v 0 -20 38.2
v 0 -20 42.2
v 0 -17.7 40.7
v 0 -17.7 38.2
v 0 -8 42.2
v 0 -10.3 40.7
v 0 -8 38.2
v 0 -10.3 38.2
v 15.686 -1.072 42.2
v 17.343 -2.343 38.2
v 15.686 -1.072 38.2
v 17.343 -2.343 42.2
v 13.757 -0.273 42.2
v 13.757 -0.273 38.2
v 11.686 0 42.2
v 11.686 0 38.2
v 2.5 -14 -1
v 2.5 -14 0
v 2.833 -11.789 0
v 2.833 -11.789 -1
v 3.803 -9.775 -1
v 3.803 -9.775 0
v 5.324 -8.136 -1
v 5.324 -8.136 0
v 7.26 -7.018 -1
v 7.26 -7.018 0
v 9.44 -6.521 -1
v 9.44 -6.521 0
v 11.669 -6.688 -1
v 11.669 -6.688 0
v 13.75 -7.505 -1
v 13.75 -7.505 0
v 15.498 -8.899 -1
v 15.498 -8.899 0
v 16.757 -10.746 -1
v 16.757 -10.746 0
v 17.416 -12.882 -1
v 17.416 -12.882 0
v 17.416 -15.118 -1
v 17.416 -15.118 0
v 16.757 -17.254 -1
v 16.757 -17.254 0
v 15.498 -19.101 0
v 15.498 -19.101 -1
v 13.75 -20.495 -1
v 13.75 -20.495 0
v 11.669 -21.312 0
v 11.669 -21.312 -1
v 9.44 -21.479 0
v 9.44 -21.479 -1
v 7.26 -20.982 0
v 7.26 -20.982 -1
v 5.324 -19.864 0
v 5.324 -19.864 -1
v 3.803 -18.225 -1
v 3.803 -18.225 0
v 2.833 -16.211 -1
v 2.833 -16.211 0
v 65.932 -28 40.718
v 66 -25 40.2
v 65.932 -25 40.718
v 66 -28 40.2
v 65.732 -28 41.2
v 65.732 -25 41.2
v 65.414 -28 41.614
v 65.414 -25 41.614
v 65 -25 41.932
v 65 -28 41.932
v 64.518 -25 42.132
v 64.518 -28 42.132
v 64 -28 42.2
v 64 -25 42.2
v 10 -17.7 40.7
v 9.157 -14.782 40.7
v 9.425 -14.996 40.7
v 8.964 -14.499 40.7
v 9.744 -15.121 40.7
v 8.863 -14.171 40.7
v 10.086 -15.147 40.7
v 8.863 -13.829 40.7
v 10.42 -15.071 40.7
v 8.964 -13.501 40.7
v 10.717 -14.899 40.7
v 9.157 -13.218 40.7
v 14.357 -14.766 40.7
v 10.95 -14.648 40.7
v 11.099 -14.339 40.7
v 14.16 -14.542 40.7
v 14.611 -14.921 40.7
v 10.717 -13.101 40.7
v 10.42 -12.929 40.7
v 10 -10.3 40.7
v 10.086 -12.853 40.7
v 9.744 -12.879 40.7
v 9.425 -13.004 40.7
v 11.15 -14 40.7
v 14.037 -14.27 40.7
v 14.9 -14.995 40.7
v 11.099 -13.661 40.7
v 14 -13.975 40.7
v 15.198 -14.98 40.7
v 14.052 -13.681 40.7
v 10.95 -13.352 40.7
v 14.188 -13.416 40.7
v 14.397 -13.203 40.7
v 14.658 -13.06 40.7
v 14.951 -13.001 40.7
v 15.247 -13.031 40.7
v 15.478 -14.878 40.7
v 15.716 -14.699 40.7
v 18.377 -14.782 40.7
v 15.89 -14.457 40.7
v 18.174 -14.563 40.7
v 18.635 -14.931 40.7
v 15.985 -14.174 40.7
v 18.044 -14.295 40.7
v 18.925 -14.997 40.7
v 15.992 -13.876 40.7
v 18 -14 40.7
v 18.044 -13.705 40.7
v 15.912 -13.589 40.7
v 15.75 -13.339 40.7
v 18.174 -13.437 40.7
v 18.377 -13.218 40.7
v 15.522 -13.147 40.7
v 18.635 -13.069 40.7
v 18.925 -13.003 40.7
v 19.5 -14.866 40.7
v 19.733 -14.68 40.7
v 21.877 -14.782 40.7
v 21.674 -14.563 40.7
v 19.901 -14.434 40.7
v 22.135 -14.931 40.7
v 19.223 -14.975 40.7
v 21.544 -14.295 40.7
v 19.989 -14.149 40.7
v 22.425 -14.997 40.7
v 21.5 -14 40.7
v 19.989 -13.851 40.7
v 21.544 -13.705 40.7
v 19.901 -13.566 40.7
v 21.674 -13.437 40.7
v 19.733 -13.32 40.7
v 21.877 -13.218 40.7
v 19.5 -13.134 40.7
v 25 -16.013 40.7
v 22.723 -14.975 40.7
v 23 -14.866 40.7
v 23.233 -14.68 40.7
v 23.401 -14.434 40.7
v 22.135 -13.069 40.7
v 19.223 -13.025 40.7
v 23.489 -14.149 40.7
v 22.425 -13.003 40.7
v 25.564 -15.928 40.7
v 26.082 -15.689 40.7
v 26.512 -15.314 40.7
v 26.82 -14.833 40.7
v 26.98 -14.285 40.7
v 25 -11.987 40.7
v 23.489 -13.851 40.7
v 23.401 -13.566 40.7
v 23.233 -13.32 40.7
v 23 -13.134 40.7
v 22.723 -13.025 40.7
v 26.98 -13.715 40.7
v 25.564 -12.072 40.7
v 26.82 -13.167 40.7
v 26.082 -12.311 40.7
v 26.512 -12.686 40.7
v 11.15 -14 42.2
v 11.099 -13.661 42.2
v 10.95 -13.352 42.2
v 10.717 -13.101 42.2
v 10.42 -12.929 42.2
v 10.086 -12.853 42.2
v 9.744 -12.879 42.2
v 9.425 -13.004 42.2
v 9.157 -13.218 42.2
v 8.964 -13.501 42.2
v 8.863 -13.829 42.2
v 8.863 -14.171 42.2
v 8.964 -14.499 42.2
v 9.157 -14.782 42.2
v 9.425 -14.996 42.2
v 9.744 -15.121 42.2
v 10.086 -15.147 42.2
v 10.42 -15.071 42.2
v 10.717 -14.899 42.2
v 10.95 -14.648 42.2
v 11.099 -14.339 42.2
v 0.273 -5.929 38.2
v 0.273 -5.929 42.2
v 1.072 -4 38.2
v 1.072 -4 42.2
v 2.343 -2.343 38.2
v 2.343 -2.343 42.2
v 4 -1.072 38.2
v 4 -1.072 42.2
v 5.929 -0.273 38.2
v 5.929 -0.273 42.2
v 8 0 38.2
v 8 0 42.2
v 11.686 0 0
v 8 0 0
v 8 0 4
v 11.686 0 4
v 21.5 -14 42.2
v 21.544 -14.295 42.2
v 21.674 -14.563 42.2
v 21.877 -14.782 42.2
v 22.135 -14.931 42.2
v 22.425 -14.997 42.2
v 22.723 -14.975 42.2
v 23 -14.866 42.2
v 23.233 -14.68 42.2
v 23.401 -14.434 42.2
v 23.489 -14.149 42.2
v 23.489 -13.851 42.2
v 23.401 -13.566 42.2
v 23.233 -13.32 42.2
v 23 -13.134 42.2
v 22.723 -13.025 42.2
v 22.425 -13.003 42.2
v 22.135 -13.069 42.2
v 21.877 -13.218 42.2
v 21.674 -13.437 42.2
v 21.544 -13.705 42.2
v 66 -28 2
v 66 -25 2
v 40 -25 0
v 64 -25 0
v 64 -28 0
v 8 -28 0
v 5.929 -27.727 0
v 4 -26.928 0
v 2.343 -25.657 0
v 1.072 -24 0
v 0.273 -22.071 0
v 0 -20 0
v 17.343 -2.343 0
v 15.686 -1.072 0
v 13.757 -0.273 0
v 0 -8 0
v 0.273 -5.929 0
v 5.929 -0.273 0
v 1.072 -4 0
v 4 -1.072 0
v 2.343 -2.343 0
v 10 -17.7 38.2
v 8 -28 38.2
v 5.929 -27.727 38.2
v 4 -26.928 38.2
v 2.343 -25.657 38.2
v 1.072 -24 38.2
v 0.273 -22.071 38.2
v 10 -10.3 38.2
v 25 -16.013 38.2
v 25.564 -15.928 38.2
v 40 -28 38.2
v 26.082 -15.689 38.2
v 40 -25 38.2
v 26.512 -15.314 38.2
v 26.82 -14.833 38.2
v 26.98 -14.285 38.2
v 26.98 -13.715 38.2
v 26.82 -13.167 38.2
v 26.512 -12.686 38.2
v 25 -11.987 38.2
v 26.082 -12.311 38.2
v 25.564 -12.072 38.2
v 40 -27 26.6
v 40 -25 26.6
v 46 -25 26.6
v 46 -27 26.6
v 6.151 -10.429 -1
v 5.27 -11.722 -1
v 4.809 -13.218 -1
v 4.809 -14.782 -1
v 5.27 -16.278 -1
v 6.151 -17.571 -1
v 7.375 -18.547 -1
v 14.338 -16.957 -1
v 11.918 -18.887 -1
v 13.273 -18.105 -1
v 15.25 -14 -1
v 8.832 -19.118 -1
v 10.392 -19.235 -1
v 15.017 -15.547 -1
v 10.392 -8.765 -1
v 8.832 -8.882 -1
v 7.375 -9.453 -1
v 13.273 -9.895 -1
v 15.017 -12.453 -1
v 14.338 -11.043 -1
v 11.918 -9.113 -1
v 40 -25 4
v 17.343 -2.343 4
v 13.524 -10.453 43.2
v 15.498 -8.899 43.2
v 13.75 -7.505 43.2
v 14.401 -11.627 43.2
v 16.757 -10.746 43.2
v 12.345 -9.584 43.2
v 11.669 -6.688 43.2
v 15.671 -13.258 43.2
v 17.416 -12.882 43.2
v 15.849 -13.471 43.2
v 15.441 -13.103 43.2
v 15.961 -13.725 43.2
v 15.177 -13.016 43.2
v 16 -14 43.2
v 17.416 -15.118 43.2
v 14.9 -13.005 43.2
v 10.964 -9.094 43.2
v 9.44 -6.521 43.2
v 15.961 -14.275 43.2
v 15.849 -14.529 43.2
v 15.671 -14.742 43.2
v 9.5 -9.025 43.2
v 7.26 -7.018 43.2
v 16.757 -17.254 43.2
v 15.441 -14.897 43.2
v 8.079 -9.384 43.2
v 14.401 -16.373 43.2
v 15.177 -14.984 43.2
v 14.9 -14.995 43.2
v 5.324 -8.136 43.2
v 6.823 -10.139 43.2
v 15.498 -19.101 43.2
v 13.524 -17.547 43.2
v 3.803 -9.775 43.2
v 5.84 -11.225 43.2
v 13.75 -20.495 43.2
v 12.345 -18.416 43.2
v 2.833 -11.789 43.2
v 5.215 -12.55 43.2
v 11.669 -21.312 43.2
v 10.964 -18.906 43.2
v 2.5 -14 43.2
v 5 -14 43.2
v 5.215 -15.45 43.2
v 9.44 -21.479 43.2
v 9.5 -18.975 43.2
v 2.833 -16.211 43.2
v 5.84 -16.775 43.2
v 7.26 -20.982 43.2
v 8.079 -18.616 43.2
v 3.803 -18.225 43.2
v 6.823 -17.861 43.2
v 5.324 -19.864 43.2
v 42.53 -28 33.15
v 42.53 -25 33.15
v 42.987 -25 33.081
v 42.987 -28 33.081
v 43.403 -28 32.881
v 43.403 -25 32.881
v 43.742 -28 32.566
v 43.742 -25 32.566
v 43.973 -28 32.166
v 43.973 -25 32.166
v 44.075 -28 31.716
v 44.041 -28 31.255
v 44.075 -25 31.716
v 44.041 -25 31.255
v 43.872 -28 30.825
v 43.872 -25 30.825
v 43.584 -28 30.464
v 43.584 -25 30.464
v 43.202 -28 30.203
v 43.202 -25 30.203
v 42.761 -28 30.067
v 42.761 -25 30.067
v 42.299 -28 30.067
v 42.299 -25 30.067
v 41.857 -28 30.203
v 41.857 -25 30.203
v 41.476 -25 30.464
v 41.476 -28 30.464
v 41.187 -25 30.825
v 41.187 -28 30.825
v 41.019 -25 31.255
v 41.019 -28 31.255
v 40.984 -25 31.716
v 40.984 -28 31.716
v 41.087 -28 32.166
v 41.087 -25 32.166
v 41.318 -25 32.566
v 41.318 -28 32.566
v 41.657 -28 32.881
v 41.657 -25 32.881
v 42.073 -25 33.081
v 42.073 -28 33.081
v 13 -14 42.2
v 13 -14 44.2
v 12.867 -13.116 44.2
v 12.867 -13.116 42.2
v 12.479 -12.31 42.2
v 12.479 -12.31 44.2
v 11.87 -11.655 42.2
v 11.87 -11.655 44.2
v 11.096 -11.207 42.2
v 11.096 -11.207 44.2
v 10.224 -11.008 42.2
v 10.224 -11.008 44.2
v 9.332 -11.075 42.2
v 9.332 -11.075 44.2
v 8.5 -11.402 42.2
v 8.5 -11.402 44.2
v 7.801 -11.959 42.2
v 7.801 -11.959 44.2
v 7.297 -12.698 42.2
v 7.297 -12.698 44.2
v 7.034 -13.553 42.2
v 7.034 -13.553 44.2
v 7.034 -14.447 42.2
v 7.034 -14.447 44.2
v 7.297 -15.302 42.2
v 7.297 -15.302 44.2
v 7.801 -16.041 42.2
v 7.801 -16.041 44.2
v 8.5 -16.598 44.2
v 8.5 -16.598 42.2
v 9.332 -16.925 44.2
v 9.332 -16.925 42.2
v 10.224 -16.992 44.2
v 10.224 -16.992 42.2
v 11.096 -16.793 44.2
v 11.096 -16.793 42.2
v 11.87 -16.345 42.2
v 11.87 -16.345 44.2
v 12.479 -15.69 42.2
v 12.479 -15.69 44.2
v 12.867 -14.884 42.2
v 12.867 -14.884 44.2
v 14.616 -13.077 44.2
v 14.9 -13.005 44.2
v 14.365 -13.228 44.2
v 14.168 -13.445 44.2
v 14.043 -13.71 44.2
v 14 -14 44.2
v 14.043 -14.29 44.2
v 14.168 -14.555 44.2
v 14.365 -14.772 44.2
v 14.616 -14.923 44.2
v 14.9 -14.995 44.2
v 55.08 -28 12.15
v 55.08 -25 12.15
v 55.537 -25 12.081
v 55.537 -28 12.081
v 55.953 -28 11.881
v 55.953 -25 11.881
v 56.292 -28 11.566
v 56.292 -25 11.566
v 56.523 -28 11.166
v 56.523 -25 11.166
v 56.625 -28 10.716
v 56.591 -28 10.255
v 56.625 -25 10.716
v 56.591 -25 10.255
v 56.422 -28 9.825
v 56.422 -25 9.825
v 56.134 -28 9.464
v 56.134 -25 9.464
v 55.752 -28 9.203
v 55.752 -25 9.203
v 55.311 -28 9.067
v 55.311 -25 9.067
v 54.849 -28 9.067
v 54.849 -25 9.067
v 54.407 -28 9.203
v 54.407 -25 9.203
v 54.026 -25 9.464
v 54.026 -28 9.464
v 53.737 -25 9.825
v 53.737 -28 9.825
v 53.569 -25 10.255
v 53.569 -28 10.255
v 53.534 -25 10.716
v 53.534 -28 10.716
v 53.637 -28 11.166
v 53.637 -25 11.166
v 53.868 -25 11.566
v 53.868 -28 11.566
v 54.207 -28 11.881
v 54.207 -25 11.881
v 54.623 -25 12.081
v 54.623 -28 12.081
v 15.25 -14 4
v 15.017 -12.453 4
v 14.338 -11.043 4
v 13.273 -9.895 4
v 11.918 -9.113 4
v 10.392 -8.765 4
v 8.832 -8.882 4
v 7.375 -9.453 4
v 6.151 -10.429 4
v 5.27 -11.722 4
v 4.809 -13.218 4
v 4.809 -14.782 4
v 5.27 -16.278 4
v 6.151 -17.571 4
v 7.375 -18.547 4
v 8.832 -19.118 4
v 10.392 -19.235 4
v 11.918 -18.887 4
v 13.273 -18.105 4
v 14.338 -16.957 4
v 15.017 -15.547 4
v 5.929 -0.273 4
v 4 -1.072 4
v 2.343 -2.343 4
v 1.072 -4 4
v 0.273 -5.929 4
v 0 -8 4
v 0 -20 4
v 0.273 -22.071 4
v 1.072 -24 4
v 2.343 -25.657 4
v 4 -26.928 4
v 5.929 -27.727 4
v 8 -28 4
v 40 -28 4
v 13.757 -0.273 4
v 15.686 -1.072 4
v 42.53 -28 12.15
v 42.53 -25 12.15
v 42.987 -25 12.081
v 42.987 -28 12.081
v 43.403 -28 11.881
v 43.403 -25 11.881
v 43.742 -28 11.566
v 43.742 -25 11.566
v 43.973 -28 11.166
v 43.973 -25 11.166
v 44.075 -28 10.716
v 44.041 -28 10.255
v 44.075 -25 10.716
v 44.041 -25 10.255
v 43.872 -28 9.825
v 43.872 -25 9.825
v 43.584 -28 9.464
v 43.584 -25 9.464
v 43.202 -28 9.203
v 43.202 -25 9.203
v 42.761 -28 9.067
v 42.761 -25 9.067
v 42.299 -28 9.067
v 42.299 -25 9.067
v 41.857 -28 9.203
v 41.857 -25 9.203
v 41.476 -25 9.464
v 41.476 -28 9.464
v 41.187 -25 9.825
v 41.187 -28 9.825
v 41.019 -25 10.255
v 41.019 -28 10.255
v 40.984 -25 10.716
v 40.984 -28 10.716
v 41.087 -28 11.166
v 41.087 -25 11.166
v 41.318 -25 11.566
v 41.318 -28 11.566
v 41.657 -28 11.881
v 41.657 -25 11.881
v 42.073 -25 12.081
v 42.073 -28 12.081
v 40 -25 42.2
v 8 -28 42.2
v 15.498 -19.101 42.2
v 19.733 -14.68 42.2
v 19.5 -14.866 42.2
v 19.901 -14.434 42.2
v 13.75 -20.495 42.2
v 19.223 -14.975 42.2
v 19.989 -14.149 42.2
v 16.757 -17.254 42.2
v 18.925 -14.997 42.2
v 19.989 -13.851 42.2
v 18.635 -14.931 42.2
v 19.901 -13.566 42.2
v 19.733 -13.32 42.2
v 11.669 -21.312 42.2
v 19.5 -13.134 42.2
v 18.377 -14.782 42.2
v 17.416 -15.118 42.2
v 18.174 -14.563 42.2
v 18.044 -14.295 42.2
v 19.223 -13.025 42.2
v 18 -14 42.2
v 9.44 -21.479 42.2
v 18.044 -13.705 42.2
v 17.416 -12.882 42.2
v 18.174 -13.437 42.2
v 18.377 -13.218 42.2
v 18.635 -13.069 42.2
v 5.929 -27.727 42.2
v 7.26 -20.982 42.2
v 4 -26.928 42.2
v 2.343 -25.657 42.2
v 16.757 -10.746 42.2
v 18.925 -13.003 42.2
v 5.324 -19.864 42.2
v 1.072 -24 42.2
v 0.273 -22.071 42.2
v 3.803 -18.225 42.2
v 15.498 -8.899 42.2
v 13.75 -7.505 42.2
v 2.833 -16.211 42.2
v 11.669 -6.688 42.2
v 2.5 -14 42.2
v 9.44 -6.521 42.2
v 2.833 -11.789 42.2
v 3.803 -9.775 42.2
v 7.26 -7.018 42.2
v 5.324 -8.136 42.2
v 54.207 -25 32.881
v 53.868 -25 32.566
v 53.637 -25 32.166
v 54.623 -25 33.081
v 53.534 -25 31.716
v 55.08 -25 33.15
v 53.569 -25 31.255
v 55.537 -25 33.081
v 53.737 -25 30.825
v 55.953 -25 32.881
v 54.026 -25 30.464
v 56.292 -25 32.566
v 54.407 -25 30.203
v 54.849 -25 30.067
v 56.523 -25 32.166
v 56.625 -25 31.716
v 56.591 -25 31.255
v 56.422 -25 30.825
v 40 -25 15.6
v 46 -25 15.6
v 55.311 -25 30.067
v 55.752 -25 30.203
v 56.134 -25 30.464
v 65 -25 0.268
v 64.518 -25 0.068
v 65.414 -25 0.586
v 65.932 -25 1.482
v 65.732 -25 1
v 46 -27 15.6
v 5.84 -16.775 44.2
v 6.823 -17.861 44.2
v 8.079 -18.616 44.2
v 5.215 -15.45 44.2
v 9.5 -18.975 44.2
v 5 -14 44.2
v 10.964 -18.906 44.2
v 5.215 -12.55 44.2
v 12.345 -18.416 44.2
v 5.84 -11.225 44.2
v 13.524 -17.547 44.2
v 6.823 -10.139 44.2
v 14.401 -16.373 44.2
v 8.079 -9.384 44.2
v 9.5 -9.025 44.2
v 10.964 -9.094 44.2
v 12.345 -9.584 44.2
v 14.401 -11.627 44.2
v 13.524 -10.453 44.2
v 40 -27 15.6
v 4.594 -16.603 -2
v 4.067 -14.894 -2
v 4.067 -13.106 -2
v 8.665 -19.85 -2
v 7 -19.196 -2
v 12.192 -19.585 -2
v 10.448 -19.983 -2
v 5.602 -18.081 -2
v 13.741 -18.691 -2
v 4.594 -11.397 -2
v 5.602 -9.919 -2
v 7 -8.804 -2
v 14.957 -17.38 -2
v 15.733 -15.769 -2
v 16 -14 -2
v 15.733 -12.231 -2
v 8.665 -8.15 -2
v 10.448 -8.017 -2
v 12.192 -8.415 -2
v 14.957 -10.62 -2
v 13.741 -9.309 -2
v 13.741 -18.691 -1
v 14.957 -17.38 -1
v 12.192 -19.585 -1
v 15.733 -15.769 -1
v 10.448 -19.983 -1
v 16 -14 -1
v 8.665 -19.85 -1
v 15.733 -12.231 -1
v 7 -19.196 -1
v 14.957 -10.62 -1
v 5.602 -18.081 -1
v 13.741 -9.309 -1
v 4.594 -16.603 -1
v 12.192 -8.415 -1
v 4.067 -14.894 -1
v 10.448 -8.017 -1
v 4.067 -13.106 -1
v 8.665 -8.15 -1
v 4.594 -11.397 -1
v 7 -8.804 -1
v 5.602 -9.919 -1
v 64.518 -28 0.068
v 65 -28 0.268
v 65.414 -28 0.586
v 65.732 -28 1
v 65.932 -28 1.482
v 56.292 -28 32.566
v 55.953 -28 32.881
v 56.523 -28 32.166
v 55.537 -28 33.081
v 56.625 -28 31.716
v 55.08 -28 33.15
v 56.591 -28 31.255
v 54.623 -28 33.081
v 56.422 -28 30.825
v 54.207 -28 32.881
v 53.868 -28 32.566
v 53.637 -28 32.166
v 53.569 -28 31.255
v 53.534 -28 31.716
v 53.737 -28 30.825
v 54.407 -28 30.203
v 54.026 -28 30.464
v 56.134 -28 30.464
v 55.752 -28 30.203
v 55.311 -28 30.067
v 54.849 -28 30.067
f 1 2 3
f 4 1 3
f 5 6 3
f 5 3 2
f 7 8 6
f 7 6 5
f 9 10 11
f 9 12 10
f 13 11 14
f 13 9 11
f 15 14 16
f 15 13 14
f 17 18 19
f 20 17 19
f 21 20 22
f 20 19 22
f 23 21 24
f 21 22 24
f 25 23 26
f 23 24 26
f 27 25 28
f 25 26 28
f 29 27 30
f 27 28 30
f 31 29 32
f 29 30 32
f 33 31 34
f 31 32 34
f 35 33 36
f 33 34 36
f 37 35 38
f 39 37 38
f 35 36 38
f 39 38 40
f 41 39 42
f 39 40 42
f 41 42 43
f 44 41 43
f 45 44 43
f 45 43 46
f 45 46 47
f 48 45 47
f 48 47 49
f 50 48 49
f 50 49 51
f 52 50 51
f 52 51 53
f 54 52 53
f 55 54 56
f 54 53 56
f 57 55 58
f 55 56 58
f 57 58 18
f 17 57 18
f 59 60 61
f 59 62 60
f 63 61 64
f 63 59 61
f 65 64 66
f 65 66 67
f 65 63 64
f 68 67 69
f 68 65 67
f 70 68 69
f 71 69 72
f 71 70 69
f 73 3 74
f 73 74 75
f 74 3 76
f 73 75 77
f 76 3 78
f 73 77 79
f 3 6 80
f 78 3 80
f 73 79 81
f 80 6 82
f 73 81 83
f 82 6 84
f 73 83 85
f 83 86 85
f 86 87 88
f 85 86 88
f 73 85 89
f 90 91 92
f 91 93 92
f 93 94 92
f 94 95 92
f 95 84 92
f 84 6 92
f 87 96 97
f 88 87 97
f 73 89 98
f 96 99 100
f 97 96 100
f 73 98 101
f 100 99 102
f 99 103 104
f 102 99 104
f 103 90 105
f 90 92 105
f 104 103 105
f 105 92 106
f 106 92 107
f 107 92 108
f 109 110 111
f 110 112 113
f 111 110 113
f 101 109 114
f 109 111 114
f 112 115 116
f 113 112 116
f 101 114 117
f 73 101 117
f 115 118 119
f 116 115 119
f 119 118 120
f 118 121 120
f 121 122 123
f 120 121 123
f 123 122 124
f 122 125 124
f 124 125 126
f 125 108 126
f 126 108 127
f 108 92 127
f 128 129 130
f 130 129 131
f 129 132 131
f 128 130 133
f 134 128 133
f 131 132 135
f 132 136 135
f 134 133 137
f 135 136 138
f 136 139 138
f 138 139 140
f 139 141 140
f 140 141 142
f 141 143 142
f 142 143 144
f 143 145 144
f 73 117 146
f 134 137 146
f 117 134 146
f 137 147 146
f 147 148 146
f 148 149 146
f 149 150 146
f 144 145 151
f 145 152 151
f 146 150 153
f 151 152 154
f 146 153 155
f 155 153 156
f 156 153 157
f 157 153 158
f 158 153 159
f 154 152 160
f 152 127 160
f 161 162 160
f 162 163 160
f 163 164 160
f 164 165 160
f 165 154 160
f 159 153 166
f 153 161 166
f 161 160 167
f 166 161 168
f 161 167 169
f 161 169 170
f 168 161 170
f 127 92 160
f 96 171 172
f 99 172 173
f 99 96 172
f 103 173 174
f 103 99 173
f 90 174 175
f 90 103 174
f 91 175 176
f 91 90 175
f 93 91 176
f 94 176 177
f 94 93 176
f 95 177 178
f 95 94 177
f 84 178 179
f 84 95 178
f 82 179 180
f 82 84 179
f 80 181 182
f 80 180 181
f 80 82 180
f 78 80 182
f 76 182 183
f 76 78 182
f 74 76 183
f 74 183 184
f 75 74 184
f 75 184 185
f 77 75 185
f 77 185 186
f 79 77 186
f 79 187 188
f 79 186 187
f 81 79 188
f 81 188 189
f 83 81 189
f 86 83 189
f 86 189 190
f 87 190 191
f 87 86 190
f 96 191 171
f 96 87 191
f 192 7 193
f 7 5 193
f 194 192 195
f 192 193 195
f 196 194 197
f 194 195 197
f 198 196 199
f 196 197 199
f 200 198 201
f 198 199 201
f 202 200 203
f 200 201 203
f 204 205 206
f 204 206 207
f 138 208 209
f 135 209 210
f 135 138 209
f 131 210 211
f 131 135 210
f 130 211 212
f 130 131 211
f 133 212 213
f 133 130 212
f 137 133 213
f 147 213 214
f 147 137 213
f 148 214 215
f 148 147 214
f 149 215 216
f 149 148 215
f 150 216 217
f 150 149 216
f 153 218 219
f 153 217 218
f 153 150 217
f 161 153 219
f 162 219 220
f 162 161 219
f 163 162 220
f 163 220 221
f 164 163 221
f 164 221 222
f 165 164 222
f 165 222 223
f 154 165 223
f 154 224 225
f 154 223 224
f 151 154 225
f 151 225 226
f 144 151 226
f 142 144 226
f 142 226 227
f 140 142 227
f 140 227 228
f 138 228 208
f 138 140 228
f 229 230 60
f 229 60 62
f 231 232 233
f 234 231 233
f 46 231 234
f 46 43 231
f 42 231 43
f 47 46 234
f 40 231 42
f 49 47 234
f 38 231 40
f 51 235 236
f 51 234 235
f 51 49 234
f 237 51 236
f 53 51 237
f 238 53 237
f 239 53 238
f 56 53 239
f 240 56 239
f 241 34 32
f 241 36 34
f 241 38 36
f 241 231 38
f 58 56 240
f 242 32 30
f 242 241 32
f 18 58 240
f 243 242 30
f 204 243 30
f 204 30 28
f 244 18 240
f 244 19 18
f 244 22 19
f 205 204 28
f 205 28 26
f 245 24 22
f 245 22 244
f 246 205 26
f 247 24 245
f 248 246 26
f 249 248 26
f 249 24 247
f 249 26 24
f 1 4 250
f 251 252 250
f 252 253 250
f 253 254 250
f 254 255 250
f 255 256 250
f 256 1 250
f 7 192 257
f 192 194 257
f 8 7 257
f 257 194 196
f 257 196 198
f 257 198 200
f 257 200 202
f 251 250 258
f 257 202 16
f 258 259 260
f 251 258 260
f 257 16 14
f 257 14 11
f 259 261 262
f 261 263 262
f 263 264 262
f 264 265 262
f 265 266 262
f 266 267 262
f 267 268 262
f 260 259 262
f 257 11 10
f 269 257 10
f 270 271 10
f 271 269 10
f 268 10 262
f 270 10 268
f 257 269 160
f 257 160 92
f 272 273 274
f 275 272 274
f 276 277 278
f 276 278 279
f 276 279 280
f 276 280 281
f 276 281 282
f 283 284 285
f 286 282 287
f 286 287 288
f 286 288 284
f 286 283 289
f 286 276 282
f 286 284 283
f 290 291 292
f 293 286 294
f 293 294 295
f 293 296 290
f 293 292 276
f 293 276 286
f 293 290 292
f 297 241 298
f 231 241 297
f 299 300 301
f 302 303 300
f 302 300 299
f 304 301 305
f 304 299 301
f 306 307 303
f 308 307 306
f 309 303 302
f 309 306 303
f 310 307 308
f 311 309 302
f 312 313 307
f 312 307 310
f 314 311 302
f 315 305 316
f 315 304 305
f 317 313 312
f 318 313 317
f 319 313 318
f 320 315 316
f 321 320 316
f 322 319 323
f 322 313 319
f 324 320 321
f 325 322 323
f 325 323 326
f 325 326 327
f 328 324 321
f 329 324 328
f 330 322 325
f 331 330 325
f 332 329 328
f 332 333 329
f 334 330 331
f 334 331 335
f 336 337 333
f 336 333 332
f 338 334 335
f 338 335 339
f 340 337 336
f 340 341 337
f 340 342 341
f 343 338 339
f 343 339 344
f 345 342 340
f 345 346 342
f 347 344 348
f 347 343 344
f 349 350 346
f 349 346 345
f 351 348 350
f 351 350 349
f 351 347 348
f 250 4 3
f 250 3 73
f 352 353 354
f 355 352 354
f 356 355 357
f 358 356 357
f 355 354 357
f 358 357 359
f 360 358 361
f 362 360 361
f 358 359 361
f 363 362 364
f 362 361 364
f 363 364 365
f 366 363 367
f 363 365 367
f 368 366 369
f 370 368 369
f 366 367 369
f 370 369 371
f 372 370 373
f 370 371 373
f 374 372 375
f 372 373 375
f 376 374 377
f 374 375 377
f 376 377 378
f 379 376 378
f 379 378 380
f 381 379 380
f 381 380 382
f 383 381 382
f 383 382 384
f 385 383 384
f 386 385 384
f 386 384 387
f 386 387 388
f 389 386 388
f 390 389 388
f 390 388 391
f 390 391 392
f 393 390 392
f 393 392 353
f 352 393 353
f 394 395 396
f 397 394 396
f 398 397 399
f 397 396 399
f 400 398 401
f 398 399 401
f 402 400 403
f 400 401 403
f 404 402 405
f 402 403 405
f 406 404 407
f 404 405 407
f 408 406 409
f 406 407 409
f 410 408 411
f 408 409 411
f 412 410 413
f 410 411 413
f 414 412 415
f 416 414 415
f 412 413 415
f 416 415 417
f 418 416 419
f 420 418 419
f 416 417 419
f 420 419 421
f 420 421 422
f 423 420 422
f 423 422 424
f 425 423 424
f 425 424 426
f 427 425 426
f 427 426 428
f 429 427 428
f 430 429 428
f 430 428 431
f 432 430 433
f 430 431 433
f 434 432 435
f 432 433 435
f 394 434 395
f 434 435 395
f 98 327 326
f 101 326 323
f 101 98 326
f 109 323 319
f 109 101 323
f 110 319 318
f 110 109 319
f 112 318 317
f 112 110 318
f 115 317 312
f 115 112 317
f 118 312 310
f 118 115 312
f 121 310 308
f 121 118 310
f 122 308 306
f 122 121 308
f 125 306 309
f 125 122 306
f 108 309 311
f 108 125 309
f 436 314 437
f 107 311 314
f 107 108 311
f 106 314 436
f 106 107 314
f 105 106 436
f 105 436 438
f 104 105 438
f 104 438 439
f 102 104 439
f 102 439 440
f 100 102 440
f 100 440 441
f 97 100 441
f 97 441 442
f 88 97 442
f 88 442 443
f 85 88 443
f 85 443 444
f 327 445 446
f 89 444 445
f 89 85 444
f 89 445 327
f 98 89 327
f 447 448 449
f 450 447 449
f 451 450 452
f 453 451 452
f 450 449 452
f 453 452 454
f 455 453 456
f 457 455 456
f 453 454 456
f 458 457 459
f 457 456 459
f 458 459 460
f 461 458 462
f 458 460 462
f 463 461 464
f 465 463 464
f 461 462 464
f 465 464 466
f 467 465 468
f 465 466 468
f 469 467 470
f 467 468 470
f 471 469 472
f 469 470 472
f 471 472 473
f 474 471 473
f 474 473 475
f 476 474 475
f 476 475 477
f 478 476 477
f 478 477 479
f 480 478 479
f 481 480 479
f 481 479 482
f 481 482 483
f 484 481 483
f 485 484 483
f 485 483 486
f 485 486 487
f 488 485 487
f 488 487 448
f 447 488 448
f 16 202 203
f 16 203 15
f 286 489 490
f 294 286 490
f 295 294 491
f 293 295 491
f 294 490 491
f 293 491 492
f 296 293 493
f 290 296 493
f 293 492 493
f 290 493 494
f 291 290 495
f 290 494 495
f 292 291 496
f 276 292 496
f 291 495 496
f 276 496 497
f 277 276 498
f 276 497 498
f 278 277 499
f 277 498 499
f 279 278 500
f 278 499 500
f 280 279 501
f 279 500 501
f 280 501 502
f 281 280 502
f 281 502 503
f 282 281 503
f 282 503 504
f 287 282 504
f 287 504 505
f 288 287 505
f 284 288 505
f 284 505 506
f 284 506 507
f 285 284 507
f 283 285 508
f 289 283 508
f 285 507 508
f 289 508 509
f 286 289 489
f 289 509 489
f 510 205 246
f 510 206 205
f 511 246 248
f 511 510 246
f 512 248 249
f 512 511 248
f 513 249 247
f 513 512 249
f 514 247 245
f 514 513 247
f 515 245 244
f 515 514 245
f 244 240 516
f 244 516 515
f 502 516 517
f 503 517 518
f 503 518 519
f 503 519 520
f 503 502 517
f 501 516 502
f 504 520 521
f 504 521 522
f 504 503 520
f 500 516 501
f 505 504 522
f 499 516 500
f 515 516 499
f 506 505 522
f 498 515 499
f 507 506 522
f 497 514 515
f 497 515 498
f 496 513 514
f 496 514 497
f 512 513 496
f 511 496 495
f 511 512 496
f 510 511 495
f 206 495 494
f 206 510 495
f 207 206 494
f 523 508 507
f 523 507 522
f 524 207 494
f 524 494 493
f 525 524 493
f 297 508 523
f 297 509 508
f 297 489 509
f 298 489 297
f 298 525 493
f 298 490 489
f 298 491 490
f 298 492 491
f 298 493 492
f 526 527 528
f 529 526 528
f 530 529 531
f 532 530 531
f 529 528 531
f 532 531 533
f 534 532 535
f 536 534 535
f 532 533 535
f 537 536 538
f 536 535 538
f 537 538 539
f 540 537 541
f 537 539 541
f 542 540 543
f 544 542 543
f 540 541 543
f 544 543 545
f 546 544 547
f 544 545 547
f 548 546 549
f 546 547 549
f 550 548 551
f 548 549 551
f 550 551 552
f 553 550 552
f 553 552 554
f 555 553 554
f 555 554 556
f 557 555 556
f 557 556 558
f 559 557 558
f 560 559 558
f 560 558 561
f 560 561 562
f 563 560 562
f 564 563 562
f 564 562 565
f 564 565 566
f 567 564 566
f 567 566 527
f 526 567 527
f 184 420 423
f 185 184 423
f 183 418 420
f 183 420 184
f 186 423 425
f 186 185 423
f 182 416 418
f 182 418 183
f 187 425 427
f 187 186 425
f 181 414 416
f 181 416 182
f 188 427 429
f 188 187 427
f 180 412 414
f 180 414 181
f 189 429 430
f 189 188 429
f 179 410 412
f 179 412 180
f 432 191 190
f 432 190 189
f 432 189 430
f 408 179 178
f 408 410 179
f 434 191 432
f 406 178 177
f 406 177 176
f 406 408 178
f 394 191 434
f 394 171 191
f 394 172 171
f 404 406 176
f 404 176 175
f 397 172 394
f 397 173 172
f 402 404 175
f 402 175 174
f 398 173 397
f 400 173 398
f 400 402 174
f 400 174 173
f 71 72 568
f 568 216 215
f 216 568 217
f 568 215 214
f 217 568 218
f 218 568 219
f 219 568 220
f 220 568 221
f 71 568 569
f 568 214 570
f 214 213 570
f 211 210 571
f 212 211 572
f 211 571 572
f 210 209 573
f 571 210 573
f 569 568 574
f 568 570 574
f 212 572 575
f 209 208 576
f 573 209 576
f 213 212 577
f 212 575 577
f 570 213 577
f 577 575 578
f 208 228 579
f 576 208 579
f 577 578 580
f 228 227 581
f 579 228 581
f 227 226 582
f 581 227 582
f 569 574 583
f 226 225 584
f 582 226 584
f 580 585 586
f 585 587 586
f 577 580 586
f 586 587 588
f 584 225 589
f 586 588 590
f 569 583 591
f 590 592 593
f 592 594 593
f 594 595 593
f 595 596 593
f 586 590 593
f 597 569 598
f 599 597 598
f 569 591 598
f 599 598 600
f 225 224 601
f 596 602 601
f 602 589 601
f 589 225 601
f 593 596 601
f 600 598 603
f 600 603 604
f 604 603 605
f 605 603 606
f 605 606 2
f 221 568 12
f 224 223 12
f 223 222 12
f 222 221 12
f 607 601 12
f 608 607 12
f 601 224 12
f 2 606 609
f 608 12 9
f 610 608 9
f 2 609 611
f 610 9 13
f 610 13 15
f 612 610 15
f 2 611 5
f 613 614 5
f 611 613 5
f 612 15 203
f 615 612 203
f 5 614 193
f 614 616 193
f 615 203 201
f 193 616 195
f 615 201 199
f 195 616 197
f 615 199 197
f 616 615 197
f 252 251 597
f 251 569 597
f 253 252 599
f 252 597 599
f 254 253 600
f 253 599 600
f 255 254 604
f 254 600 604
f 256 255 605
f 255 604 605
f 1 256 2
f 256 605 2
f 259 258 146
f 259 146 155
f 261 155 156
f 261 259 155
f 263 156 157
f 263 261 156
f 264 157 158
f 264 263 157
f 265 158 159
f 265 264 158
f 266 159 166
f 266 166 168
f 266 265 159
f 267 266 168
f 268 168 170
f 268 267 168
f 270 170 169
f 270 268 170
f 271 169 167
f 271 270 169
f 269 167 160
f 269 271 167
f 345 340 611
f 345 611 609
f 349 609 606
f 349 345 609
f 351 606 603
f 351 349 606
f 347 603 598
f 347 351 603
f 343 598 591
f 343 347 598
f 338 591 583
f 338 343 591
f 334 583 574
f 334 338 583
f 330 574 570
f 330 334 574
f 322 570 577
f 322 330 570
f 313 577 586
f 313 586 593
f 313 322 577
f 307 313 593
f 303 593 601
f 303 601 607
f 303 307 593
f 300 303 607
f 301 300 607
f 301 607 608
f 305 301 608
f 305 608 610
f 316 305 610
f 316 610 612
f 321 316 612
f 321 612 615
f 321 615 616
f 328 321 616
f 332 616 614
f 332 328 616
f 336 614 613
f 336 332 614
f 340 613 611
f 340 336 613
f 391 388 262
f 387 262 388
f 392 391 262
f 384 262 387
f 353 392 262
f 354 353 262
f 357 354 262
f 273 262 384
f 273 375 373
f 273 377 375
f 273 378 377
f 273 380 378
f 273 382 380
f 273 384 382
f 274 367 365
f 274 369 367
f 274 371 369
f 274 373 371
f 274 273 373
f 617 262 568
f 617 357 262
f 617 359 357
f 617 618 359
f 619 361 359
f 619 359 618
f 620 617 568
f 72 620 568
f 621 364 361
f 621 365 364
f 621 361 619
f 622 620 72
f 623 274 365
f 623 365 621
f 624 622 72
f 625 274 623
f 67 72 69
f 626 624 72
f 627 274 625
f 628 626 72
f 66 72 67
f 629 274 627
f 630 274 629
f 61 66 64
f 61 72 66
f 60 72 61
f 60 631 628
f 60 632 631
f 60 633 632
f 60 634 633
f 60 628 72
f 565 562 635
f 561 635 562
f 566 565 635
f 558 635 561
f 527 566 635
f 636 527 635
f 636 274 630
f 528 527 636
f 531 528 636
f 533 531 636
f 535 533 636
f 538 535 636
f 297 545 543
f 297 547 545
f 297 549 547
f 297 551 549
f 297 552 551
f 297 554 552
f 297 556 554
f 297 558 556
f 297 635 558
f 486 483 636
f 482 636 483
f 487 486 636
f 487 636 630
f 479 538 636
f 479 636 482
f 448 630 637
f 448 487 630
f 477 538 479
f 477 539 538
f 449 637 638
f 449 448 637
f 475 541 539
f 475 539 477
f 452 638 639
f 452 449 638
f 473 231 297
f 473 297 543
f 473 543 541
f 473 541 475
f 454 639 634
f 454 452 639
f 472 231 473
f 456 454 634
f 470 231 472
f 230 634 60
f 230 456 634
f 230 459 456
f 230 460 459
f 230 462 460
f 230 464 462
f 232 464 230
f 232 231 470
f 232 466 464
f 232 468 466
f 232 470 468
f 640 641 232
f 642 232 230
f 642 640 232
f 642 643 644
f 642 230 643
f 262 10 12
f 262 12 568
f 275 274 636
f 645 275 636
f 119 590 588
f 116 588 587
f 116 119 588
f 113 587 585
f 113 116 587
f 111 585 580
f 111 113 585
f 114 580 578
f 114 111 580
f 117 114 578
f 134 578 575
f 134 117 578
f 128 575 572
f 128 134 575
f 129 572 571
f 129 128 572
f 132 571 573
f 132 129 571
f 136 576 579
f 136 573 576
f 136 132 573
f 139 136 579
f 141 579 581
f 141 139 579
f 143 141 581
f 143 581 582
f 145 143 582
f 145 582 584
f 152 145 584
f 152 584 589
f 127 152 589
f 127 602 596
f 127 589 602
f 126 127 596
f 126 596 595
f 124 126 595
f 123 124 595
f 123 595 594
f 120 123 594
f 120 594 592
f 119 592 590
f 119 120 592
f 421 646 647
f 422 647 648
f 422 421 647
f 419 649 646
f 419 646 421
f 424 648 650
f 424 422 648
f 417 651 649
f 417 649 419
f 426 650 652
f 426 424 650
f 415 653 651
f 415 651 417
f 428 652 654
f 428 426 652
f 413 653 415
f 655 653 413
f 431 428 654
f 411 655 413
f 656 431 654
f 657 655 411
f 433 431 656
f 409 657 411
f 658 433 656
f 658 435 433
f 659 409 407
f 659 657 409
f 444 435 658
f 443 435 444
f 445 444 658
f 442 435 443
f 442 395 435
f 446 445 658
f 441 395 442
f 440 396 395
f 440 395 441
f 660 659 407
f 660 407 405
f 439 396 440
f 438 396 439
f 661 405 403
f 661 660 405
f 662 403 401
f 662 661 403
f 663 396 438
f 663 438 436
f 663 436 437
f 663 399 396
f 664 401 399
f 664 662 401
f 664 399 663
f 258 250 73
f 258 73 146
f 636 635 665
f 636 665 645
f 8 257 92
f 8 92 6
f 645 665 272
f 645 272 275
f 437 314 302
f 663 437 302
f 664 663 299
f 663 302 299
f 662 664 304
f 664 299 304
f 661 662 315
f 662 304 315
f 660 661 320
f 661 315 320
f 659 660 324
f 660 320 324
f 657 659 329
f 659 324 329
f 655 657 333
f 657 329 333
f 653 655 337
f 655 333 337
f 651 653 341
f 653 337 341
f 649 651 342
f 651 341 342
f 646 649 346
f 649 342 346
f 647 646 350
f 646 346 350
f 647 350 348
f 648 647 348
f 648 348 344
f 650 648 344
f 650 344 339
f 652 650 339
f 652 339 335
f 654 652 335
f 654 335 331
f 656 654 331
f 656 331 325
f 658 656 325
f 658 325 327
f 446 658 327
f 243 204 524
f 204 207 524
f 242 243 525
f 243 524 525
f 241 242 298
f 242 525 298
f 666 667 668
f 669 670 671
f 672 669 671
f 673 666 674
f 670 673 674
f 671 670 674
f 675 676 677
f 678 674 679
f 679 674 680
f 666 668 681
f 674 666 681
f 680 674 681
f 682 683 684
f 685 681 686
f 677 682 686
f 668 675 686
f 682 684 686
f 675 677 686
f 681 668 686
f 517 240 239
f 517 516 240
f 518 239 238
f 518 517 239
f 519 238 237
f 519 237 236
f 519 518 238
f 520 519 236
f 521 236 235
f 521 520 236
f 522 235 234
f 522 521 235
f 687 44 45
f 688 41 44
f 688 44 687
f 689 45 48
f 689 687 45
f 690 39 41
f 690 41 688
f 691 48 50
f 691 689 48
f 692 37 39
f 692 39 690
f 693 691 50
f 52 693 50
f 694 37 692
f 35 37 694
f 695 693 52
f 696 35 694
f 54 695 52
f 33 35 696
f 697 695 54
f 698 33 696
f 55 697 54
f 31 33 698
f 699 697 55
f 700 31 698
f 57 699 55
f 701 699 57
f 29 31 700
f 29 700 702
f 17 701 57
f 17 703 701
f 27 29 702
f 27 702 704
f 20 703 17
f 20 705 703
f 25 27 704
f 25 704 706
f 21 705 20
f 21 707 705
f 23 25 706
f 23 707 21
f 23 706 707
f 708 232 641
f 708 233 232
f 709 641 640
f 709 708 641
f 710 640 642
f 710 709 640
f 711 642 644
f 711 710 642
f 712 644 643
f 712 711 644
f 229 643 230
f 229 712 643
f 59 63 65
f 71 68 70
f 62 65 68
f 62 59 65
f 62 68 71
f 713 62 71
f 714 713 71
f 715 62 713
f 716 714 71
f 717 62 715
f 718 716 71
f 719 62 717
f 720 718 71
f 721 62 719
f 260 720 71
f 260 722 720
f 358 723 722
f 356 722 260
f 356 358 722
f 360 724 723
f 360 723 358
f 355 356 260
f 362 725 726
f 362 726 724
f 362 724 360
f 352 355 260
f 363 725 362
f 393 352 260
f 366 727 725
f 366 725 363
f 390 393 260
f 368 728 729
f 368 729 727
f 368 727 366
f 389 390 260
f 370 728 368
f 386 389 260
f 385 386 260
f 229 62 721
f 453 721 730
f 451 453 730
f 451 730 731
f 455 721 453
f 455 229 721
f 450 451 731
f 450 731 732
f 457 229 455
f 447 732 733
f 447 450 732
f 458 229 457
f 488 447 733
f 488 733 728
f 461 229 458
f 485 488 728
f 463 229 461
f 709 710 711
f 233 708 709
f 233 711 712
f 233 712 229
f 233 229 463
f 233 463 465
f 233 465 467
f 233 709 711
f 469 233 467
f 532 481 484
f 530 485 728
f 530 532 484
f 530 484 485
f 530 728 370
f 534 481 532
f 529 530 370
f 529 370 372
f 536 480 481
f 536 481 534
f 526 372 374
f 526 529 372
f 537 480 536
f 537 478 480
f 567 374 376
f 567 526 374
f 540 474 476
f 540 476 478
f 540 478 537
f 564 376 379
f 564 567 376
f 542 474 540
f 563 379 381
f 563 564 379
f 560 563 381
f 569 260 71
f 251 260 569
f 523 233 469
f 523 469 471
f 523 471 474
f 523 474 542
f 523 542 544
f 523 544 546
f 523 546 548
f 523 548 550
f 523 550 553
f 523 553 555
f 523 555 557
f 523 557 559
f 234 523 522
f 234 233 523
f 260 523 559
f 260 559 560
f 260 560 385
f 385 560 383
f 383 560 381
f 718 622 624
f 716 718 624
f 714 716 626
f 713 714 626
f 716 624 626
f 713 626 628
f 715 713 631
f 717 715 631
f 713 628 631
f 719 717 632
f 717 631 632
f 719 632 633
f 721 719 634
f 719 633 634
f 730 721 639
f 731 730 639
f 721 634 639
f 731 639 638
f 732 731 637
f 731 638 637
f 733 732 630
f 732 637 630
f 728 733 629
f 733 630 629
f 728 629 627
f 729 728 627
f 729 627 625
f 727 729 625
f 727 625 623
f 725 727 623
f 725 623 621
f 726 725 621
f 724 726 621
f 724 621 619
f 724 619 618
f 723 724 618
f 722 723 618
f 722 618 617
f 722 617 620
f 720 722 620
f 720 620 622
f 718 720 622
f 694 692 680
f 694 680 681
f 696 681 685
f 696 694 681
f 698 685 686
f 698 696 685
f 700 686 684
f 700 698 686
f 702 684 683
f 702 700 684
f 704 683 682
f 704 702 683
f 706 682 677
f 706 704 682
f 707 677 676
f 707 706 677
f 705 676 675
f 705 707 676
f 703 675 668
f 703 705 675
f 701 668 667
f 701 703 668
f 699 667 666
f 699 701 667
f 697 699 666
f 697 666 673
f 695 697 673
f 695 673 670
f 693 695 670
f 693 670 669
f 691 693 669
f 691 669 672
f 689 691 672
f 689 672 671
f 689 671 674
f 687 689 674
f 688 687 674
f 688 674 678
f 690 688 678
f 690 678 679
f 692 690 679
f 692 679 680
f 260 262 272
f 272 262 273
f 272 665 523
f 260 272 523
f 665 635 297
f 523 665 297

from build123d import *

# Parameters (mm, degrees)
PERFIL_LATERAL_DEPTH        = 42.2
SKETCH7_W                   = 40
SKETCH7_H                   = 34.2
CORTE_VERTICAL_PERFIL_DEPTH = 84.191586113
SKETCH8_R                   = 6
SOPORTE_AL_EJE_GIRO_1_DEPTH = 2
SKETCH10_R                  = 7.5
SOPORTE_AL_EJE_GIRO_2_DEPTH = 1
SKETCH11_R                  = 5.25
EJE_GIRO_DEPTH              = 5
SERVO_HORN_BED_DEPTH        = 2.5
SKETCH13_R                  = 1.55
HUECOS_BASE_LASER_DEPTH     = 83.230408001
FILLET1_R                   = 8
DECORACION_START            = 1
SKETCH14_R                  = 7.5
DECORACION_HORN_DEPTH       = 1
SKETCH15_R                  = 5
DECORACION_HORN_2_DEPTH     = 1
TORNILLOS_HORN_DEPTH        = 85.22374962
TORNILLOS_HORN_DEPTH_BACK   = 1.5
SKETCH12_R                  = 1.15
SKETCH12_R_2                = 1
SKETCH16_R                  = 3
CABEZA_TORNILLO_HORN_DEPTH  = 2
SKETCH17_W                  = 12
SKETCH17_H                  = 11
CUT_EXTRUDE9_DEPTH          = 2
FILLET2_R                   = 2


with BuildPart() as part:
    # Sketch6 → Perfil lateral (new body)
    with BuildSketch(Plane.XY):
        Polygon((0, 0), (15, 0), (40, -25), (66, -25), (66, -28), (0, -28), align=None)
    extrude(amount=PERFIL_LATERAL_DEPTH)

    # Sketch7 → Corte vertical perfil (cut, through all)
    with BuildSketch(Plane(origin=(0, 0, 0), x_dir=(1, 0, 0), z_dir=(0, 1, 0))):
        with Locations((20, -21.1)):
            Rectangle(SKETCH7_W, SKETCH7_H)
    extrude(amount=-CORTE_VERTICAL_PERFIL_DEPTH, mode=Mode.SUBTRACT)

    # Sketch8 → soporte al eje giro 1 (add)
    with BuildSketch(Plane.XY):
        with Locations((10, -14)):
            Circle(SKETCH8_R)
    extrude(amount=-SOPORTE_AL_EJE_GIRO_1_DEPTH)

    # Sketch10 → soporte al eje giro 2 (add)
    with BuildSketch(Plane(origin=(0, 0, 0), x_dir=(-1, 0, 0), z_dir=(0, 0, -1))):
        with Locations((-10, -14)):
            Circle(SKETCH10_R)
    extrude(amount=SOPORTE_AL_EJE_GIRO_2_DEPTH)

    # Sketch11 → eje giro (cut)
    with BuildSketch(Plane.XY.offset(4)):
        with Locations((10, -14)):
            Circle(SKETCH11_R)
    extrude(amount=-EJE_GIRO_DEPTH, mode=Mode.SUBTRACT)

    # Sketch9 → servo horn bed (cut)
    with BuildSketch(Plane.XY.offset(38.2)):
        with BuildLine():
            Line((0, -17.7), (10, -17.7))
            Line((10, -17.7), (25, -16.012614746))
            ThreePointArc((25, -16.012614746), (27, -14), (25, -11.987385254))
            Line((25, -11.987385254), (10, -10.3))
            Line((10, -10.3), (0, -10.3))
            Line((0, -10.3), (0, -17.7))
        make_face()
    extrude(amount=SERVO_HORN_BED_DEPTH, mode=Mode.SUBTRACT)

    # Sketch13 → Huecos base laser (cut, through all)
    with BuildSketch(Plane(origin=(0, -25, 0), x_dir=(1, 0, 0), z_dir=(0, 1, 0))):
        with Locations(Location((55.079807472, -31.6, 0), (0, 0, 270))):
            Circle(SKETCH13_R)
        with Locations(Location((42.529807472, -31.6, 0), (0, 0, 270))):
            Circle(SKETCH13_R)
        with Locations(Location((42.529807472, -10.6, 0), (0, 0, 270))):
            Circle(SKETCH13_R)
        with Locations(Location((55.079807472, -10.6, 0), (0, 0, 270))):
            Circle(SKETCH13_R)
    extrude(amount=-HUECOS_BASE_LASER_DEPTH, mode=Mode.SUBTRACT)

    # Fillet1
    fillet1_edges = [part.edges().sort_by_distance(p)[0] for p in [
        (0, 0, 40.2),
        (15, 0, 40.2),
        (0, -28, 40.2),
        (0, 0, 2),
        (15, 0, 2),
        (0, -28, 2),
    ]]
    fillet(fillet1_edges, radius=FILLET1_R)

    # Sketch14 → Decoracion horn (add)
    with BuildSketch(Plane.XY.offset(42.2).offset(DECORACION_START)):
        with Locations(Location((10, -14, 0), (0, 0, 180))):
            Circle(SKETCH14_R)
    extrude(amount=-DECORACION_HORN_DEPTH)

    # Sketch15 → Decoracion Horn 2 (add)
    with BuildSketch(Plane.XY.offset(43.2)):
        with Locations((10, -14)):
            Circle(SKETCH15_R)
    extrude(amount=DECORACION_HORN_2_DEPTH)

    # Sketch12 → Tornillos horn (cut, two sides: drawn at the far end of the back side and taken through both)
    with BuildSketch(Plane.XY.offset(42.2).offset(-TORNILLOS_HORN_DEPTH_BACK)):
        with Locations((10, -14)):
            Circle(SKETCH12_R)
        with Locations(Location((15, -14, 0), (0, 0, 264.260829523))):
            Circle(SKETCH12_R_2)
        with Locations(Location((19, -14, 0), (0, 0, 180))):
            Circle(SKETCH12_R_2)
        with Locations(Location((22.5, -14, 0), (0, 0, 180))):
            Circle(SKETCH12_R_2)
    extrude(amount=TORNILLOS_HORN_DEPTH + TORNILLOS_HORN_DEPTH_BACK, mode=Mode.SUBTRACT)

    # Sketch16 → cabeza tornillo horn (cut)
    with BuildSketch(Plane.XY.offset(44.2)):
        with Locations((10, -14)):
            Circle(SKETCH16_R)
    extrude(amount=-CABEZA_TORNILLO_HORN_DEPTH, mode=Mode.SUBTRACT)

    # Sketch17 → Cut-Extrude9 (cut)
    with BuildSketch(Plane(origin=(0, -25, 0), x_dir=(1, 0, 0), z_dir=(0, 1, 0))):
        with Locations((40, -21.1)):
            Rectangle(SKETCH17_W, SKETCH17_H)
    extrude(amount=-CUT_EXTRUDE9_DEPTH, mode=Mode.SUBTRACT)

    # Fillet2
    fillet2_edges = [part.edges().sort_by_distance(p)[0] for p in [
        (66, -26.5, 42.2),
        (66, -26.5, 0),
    ]]
    fillet(fillet2_edges, radius=FILLET2_R)


solid = part.part
